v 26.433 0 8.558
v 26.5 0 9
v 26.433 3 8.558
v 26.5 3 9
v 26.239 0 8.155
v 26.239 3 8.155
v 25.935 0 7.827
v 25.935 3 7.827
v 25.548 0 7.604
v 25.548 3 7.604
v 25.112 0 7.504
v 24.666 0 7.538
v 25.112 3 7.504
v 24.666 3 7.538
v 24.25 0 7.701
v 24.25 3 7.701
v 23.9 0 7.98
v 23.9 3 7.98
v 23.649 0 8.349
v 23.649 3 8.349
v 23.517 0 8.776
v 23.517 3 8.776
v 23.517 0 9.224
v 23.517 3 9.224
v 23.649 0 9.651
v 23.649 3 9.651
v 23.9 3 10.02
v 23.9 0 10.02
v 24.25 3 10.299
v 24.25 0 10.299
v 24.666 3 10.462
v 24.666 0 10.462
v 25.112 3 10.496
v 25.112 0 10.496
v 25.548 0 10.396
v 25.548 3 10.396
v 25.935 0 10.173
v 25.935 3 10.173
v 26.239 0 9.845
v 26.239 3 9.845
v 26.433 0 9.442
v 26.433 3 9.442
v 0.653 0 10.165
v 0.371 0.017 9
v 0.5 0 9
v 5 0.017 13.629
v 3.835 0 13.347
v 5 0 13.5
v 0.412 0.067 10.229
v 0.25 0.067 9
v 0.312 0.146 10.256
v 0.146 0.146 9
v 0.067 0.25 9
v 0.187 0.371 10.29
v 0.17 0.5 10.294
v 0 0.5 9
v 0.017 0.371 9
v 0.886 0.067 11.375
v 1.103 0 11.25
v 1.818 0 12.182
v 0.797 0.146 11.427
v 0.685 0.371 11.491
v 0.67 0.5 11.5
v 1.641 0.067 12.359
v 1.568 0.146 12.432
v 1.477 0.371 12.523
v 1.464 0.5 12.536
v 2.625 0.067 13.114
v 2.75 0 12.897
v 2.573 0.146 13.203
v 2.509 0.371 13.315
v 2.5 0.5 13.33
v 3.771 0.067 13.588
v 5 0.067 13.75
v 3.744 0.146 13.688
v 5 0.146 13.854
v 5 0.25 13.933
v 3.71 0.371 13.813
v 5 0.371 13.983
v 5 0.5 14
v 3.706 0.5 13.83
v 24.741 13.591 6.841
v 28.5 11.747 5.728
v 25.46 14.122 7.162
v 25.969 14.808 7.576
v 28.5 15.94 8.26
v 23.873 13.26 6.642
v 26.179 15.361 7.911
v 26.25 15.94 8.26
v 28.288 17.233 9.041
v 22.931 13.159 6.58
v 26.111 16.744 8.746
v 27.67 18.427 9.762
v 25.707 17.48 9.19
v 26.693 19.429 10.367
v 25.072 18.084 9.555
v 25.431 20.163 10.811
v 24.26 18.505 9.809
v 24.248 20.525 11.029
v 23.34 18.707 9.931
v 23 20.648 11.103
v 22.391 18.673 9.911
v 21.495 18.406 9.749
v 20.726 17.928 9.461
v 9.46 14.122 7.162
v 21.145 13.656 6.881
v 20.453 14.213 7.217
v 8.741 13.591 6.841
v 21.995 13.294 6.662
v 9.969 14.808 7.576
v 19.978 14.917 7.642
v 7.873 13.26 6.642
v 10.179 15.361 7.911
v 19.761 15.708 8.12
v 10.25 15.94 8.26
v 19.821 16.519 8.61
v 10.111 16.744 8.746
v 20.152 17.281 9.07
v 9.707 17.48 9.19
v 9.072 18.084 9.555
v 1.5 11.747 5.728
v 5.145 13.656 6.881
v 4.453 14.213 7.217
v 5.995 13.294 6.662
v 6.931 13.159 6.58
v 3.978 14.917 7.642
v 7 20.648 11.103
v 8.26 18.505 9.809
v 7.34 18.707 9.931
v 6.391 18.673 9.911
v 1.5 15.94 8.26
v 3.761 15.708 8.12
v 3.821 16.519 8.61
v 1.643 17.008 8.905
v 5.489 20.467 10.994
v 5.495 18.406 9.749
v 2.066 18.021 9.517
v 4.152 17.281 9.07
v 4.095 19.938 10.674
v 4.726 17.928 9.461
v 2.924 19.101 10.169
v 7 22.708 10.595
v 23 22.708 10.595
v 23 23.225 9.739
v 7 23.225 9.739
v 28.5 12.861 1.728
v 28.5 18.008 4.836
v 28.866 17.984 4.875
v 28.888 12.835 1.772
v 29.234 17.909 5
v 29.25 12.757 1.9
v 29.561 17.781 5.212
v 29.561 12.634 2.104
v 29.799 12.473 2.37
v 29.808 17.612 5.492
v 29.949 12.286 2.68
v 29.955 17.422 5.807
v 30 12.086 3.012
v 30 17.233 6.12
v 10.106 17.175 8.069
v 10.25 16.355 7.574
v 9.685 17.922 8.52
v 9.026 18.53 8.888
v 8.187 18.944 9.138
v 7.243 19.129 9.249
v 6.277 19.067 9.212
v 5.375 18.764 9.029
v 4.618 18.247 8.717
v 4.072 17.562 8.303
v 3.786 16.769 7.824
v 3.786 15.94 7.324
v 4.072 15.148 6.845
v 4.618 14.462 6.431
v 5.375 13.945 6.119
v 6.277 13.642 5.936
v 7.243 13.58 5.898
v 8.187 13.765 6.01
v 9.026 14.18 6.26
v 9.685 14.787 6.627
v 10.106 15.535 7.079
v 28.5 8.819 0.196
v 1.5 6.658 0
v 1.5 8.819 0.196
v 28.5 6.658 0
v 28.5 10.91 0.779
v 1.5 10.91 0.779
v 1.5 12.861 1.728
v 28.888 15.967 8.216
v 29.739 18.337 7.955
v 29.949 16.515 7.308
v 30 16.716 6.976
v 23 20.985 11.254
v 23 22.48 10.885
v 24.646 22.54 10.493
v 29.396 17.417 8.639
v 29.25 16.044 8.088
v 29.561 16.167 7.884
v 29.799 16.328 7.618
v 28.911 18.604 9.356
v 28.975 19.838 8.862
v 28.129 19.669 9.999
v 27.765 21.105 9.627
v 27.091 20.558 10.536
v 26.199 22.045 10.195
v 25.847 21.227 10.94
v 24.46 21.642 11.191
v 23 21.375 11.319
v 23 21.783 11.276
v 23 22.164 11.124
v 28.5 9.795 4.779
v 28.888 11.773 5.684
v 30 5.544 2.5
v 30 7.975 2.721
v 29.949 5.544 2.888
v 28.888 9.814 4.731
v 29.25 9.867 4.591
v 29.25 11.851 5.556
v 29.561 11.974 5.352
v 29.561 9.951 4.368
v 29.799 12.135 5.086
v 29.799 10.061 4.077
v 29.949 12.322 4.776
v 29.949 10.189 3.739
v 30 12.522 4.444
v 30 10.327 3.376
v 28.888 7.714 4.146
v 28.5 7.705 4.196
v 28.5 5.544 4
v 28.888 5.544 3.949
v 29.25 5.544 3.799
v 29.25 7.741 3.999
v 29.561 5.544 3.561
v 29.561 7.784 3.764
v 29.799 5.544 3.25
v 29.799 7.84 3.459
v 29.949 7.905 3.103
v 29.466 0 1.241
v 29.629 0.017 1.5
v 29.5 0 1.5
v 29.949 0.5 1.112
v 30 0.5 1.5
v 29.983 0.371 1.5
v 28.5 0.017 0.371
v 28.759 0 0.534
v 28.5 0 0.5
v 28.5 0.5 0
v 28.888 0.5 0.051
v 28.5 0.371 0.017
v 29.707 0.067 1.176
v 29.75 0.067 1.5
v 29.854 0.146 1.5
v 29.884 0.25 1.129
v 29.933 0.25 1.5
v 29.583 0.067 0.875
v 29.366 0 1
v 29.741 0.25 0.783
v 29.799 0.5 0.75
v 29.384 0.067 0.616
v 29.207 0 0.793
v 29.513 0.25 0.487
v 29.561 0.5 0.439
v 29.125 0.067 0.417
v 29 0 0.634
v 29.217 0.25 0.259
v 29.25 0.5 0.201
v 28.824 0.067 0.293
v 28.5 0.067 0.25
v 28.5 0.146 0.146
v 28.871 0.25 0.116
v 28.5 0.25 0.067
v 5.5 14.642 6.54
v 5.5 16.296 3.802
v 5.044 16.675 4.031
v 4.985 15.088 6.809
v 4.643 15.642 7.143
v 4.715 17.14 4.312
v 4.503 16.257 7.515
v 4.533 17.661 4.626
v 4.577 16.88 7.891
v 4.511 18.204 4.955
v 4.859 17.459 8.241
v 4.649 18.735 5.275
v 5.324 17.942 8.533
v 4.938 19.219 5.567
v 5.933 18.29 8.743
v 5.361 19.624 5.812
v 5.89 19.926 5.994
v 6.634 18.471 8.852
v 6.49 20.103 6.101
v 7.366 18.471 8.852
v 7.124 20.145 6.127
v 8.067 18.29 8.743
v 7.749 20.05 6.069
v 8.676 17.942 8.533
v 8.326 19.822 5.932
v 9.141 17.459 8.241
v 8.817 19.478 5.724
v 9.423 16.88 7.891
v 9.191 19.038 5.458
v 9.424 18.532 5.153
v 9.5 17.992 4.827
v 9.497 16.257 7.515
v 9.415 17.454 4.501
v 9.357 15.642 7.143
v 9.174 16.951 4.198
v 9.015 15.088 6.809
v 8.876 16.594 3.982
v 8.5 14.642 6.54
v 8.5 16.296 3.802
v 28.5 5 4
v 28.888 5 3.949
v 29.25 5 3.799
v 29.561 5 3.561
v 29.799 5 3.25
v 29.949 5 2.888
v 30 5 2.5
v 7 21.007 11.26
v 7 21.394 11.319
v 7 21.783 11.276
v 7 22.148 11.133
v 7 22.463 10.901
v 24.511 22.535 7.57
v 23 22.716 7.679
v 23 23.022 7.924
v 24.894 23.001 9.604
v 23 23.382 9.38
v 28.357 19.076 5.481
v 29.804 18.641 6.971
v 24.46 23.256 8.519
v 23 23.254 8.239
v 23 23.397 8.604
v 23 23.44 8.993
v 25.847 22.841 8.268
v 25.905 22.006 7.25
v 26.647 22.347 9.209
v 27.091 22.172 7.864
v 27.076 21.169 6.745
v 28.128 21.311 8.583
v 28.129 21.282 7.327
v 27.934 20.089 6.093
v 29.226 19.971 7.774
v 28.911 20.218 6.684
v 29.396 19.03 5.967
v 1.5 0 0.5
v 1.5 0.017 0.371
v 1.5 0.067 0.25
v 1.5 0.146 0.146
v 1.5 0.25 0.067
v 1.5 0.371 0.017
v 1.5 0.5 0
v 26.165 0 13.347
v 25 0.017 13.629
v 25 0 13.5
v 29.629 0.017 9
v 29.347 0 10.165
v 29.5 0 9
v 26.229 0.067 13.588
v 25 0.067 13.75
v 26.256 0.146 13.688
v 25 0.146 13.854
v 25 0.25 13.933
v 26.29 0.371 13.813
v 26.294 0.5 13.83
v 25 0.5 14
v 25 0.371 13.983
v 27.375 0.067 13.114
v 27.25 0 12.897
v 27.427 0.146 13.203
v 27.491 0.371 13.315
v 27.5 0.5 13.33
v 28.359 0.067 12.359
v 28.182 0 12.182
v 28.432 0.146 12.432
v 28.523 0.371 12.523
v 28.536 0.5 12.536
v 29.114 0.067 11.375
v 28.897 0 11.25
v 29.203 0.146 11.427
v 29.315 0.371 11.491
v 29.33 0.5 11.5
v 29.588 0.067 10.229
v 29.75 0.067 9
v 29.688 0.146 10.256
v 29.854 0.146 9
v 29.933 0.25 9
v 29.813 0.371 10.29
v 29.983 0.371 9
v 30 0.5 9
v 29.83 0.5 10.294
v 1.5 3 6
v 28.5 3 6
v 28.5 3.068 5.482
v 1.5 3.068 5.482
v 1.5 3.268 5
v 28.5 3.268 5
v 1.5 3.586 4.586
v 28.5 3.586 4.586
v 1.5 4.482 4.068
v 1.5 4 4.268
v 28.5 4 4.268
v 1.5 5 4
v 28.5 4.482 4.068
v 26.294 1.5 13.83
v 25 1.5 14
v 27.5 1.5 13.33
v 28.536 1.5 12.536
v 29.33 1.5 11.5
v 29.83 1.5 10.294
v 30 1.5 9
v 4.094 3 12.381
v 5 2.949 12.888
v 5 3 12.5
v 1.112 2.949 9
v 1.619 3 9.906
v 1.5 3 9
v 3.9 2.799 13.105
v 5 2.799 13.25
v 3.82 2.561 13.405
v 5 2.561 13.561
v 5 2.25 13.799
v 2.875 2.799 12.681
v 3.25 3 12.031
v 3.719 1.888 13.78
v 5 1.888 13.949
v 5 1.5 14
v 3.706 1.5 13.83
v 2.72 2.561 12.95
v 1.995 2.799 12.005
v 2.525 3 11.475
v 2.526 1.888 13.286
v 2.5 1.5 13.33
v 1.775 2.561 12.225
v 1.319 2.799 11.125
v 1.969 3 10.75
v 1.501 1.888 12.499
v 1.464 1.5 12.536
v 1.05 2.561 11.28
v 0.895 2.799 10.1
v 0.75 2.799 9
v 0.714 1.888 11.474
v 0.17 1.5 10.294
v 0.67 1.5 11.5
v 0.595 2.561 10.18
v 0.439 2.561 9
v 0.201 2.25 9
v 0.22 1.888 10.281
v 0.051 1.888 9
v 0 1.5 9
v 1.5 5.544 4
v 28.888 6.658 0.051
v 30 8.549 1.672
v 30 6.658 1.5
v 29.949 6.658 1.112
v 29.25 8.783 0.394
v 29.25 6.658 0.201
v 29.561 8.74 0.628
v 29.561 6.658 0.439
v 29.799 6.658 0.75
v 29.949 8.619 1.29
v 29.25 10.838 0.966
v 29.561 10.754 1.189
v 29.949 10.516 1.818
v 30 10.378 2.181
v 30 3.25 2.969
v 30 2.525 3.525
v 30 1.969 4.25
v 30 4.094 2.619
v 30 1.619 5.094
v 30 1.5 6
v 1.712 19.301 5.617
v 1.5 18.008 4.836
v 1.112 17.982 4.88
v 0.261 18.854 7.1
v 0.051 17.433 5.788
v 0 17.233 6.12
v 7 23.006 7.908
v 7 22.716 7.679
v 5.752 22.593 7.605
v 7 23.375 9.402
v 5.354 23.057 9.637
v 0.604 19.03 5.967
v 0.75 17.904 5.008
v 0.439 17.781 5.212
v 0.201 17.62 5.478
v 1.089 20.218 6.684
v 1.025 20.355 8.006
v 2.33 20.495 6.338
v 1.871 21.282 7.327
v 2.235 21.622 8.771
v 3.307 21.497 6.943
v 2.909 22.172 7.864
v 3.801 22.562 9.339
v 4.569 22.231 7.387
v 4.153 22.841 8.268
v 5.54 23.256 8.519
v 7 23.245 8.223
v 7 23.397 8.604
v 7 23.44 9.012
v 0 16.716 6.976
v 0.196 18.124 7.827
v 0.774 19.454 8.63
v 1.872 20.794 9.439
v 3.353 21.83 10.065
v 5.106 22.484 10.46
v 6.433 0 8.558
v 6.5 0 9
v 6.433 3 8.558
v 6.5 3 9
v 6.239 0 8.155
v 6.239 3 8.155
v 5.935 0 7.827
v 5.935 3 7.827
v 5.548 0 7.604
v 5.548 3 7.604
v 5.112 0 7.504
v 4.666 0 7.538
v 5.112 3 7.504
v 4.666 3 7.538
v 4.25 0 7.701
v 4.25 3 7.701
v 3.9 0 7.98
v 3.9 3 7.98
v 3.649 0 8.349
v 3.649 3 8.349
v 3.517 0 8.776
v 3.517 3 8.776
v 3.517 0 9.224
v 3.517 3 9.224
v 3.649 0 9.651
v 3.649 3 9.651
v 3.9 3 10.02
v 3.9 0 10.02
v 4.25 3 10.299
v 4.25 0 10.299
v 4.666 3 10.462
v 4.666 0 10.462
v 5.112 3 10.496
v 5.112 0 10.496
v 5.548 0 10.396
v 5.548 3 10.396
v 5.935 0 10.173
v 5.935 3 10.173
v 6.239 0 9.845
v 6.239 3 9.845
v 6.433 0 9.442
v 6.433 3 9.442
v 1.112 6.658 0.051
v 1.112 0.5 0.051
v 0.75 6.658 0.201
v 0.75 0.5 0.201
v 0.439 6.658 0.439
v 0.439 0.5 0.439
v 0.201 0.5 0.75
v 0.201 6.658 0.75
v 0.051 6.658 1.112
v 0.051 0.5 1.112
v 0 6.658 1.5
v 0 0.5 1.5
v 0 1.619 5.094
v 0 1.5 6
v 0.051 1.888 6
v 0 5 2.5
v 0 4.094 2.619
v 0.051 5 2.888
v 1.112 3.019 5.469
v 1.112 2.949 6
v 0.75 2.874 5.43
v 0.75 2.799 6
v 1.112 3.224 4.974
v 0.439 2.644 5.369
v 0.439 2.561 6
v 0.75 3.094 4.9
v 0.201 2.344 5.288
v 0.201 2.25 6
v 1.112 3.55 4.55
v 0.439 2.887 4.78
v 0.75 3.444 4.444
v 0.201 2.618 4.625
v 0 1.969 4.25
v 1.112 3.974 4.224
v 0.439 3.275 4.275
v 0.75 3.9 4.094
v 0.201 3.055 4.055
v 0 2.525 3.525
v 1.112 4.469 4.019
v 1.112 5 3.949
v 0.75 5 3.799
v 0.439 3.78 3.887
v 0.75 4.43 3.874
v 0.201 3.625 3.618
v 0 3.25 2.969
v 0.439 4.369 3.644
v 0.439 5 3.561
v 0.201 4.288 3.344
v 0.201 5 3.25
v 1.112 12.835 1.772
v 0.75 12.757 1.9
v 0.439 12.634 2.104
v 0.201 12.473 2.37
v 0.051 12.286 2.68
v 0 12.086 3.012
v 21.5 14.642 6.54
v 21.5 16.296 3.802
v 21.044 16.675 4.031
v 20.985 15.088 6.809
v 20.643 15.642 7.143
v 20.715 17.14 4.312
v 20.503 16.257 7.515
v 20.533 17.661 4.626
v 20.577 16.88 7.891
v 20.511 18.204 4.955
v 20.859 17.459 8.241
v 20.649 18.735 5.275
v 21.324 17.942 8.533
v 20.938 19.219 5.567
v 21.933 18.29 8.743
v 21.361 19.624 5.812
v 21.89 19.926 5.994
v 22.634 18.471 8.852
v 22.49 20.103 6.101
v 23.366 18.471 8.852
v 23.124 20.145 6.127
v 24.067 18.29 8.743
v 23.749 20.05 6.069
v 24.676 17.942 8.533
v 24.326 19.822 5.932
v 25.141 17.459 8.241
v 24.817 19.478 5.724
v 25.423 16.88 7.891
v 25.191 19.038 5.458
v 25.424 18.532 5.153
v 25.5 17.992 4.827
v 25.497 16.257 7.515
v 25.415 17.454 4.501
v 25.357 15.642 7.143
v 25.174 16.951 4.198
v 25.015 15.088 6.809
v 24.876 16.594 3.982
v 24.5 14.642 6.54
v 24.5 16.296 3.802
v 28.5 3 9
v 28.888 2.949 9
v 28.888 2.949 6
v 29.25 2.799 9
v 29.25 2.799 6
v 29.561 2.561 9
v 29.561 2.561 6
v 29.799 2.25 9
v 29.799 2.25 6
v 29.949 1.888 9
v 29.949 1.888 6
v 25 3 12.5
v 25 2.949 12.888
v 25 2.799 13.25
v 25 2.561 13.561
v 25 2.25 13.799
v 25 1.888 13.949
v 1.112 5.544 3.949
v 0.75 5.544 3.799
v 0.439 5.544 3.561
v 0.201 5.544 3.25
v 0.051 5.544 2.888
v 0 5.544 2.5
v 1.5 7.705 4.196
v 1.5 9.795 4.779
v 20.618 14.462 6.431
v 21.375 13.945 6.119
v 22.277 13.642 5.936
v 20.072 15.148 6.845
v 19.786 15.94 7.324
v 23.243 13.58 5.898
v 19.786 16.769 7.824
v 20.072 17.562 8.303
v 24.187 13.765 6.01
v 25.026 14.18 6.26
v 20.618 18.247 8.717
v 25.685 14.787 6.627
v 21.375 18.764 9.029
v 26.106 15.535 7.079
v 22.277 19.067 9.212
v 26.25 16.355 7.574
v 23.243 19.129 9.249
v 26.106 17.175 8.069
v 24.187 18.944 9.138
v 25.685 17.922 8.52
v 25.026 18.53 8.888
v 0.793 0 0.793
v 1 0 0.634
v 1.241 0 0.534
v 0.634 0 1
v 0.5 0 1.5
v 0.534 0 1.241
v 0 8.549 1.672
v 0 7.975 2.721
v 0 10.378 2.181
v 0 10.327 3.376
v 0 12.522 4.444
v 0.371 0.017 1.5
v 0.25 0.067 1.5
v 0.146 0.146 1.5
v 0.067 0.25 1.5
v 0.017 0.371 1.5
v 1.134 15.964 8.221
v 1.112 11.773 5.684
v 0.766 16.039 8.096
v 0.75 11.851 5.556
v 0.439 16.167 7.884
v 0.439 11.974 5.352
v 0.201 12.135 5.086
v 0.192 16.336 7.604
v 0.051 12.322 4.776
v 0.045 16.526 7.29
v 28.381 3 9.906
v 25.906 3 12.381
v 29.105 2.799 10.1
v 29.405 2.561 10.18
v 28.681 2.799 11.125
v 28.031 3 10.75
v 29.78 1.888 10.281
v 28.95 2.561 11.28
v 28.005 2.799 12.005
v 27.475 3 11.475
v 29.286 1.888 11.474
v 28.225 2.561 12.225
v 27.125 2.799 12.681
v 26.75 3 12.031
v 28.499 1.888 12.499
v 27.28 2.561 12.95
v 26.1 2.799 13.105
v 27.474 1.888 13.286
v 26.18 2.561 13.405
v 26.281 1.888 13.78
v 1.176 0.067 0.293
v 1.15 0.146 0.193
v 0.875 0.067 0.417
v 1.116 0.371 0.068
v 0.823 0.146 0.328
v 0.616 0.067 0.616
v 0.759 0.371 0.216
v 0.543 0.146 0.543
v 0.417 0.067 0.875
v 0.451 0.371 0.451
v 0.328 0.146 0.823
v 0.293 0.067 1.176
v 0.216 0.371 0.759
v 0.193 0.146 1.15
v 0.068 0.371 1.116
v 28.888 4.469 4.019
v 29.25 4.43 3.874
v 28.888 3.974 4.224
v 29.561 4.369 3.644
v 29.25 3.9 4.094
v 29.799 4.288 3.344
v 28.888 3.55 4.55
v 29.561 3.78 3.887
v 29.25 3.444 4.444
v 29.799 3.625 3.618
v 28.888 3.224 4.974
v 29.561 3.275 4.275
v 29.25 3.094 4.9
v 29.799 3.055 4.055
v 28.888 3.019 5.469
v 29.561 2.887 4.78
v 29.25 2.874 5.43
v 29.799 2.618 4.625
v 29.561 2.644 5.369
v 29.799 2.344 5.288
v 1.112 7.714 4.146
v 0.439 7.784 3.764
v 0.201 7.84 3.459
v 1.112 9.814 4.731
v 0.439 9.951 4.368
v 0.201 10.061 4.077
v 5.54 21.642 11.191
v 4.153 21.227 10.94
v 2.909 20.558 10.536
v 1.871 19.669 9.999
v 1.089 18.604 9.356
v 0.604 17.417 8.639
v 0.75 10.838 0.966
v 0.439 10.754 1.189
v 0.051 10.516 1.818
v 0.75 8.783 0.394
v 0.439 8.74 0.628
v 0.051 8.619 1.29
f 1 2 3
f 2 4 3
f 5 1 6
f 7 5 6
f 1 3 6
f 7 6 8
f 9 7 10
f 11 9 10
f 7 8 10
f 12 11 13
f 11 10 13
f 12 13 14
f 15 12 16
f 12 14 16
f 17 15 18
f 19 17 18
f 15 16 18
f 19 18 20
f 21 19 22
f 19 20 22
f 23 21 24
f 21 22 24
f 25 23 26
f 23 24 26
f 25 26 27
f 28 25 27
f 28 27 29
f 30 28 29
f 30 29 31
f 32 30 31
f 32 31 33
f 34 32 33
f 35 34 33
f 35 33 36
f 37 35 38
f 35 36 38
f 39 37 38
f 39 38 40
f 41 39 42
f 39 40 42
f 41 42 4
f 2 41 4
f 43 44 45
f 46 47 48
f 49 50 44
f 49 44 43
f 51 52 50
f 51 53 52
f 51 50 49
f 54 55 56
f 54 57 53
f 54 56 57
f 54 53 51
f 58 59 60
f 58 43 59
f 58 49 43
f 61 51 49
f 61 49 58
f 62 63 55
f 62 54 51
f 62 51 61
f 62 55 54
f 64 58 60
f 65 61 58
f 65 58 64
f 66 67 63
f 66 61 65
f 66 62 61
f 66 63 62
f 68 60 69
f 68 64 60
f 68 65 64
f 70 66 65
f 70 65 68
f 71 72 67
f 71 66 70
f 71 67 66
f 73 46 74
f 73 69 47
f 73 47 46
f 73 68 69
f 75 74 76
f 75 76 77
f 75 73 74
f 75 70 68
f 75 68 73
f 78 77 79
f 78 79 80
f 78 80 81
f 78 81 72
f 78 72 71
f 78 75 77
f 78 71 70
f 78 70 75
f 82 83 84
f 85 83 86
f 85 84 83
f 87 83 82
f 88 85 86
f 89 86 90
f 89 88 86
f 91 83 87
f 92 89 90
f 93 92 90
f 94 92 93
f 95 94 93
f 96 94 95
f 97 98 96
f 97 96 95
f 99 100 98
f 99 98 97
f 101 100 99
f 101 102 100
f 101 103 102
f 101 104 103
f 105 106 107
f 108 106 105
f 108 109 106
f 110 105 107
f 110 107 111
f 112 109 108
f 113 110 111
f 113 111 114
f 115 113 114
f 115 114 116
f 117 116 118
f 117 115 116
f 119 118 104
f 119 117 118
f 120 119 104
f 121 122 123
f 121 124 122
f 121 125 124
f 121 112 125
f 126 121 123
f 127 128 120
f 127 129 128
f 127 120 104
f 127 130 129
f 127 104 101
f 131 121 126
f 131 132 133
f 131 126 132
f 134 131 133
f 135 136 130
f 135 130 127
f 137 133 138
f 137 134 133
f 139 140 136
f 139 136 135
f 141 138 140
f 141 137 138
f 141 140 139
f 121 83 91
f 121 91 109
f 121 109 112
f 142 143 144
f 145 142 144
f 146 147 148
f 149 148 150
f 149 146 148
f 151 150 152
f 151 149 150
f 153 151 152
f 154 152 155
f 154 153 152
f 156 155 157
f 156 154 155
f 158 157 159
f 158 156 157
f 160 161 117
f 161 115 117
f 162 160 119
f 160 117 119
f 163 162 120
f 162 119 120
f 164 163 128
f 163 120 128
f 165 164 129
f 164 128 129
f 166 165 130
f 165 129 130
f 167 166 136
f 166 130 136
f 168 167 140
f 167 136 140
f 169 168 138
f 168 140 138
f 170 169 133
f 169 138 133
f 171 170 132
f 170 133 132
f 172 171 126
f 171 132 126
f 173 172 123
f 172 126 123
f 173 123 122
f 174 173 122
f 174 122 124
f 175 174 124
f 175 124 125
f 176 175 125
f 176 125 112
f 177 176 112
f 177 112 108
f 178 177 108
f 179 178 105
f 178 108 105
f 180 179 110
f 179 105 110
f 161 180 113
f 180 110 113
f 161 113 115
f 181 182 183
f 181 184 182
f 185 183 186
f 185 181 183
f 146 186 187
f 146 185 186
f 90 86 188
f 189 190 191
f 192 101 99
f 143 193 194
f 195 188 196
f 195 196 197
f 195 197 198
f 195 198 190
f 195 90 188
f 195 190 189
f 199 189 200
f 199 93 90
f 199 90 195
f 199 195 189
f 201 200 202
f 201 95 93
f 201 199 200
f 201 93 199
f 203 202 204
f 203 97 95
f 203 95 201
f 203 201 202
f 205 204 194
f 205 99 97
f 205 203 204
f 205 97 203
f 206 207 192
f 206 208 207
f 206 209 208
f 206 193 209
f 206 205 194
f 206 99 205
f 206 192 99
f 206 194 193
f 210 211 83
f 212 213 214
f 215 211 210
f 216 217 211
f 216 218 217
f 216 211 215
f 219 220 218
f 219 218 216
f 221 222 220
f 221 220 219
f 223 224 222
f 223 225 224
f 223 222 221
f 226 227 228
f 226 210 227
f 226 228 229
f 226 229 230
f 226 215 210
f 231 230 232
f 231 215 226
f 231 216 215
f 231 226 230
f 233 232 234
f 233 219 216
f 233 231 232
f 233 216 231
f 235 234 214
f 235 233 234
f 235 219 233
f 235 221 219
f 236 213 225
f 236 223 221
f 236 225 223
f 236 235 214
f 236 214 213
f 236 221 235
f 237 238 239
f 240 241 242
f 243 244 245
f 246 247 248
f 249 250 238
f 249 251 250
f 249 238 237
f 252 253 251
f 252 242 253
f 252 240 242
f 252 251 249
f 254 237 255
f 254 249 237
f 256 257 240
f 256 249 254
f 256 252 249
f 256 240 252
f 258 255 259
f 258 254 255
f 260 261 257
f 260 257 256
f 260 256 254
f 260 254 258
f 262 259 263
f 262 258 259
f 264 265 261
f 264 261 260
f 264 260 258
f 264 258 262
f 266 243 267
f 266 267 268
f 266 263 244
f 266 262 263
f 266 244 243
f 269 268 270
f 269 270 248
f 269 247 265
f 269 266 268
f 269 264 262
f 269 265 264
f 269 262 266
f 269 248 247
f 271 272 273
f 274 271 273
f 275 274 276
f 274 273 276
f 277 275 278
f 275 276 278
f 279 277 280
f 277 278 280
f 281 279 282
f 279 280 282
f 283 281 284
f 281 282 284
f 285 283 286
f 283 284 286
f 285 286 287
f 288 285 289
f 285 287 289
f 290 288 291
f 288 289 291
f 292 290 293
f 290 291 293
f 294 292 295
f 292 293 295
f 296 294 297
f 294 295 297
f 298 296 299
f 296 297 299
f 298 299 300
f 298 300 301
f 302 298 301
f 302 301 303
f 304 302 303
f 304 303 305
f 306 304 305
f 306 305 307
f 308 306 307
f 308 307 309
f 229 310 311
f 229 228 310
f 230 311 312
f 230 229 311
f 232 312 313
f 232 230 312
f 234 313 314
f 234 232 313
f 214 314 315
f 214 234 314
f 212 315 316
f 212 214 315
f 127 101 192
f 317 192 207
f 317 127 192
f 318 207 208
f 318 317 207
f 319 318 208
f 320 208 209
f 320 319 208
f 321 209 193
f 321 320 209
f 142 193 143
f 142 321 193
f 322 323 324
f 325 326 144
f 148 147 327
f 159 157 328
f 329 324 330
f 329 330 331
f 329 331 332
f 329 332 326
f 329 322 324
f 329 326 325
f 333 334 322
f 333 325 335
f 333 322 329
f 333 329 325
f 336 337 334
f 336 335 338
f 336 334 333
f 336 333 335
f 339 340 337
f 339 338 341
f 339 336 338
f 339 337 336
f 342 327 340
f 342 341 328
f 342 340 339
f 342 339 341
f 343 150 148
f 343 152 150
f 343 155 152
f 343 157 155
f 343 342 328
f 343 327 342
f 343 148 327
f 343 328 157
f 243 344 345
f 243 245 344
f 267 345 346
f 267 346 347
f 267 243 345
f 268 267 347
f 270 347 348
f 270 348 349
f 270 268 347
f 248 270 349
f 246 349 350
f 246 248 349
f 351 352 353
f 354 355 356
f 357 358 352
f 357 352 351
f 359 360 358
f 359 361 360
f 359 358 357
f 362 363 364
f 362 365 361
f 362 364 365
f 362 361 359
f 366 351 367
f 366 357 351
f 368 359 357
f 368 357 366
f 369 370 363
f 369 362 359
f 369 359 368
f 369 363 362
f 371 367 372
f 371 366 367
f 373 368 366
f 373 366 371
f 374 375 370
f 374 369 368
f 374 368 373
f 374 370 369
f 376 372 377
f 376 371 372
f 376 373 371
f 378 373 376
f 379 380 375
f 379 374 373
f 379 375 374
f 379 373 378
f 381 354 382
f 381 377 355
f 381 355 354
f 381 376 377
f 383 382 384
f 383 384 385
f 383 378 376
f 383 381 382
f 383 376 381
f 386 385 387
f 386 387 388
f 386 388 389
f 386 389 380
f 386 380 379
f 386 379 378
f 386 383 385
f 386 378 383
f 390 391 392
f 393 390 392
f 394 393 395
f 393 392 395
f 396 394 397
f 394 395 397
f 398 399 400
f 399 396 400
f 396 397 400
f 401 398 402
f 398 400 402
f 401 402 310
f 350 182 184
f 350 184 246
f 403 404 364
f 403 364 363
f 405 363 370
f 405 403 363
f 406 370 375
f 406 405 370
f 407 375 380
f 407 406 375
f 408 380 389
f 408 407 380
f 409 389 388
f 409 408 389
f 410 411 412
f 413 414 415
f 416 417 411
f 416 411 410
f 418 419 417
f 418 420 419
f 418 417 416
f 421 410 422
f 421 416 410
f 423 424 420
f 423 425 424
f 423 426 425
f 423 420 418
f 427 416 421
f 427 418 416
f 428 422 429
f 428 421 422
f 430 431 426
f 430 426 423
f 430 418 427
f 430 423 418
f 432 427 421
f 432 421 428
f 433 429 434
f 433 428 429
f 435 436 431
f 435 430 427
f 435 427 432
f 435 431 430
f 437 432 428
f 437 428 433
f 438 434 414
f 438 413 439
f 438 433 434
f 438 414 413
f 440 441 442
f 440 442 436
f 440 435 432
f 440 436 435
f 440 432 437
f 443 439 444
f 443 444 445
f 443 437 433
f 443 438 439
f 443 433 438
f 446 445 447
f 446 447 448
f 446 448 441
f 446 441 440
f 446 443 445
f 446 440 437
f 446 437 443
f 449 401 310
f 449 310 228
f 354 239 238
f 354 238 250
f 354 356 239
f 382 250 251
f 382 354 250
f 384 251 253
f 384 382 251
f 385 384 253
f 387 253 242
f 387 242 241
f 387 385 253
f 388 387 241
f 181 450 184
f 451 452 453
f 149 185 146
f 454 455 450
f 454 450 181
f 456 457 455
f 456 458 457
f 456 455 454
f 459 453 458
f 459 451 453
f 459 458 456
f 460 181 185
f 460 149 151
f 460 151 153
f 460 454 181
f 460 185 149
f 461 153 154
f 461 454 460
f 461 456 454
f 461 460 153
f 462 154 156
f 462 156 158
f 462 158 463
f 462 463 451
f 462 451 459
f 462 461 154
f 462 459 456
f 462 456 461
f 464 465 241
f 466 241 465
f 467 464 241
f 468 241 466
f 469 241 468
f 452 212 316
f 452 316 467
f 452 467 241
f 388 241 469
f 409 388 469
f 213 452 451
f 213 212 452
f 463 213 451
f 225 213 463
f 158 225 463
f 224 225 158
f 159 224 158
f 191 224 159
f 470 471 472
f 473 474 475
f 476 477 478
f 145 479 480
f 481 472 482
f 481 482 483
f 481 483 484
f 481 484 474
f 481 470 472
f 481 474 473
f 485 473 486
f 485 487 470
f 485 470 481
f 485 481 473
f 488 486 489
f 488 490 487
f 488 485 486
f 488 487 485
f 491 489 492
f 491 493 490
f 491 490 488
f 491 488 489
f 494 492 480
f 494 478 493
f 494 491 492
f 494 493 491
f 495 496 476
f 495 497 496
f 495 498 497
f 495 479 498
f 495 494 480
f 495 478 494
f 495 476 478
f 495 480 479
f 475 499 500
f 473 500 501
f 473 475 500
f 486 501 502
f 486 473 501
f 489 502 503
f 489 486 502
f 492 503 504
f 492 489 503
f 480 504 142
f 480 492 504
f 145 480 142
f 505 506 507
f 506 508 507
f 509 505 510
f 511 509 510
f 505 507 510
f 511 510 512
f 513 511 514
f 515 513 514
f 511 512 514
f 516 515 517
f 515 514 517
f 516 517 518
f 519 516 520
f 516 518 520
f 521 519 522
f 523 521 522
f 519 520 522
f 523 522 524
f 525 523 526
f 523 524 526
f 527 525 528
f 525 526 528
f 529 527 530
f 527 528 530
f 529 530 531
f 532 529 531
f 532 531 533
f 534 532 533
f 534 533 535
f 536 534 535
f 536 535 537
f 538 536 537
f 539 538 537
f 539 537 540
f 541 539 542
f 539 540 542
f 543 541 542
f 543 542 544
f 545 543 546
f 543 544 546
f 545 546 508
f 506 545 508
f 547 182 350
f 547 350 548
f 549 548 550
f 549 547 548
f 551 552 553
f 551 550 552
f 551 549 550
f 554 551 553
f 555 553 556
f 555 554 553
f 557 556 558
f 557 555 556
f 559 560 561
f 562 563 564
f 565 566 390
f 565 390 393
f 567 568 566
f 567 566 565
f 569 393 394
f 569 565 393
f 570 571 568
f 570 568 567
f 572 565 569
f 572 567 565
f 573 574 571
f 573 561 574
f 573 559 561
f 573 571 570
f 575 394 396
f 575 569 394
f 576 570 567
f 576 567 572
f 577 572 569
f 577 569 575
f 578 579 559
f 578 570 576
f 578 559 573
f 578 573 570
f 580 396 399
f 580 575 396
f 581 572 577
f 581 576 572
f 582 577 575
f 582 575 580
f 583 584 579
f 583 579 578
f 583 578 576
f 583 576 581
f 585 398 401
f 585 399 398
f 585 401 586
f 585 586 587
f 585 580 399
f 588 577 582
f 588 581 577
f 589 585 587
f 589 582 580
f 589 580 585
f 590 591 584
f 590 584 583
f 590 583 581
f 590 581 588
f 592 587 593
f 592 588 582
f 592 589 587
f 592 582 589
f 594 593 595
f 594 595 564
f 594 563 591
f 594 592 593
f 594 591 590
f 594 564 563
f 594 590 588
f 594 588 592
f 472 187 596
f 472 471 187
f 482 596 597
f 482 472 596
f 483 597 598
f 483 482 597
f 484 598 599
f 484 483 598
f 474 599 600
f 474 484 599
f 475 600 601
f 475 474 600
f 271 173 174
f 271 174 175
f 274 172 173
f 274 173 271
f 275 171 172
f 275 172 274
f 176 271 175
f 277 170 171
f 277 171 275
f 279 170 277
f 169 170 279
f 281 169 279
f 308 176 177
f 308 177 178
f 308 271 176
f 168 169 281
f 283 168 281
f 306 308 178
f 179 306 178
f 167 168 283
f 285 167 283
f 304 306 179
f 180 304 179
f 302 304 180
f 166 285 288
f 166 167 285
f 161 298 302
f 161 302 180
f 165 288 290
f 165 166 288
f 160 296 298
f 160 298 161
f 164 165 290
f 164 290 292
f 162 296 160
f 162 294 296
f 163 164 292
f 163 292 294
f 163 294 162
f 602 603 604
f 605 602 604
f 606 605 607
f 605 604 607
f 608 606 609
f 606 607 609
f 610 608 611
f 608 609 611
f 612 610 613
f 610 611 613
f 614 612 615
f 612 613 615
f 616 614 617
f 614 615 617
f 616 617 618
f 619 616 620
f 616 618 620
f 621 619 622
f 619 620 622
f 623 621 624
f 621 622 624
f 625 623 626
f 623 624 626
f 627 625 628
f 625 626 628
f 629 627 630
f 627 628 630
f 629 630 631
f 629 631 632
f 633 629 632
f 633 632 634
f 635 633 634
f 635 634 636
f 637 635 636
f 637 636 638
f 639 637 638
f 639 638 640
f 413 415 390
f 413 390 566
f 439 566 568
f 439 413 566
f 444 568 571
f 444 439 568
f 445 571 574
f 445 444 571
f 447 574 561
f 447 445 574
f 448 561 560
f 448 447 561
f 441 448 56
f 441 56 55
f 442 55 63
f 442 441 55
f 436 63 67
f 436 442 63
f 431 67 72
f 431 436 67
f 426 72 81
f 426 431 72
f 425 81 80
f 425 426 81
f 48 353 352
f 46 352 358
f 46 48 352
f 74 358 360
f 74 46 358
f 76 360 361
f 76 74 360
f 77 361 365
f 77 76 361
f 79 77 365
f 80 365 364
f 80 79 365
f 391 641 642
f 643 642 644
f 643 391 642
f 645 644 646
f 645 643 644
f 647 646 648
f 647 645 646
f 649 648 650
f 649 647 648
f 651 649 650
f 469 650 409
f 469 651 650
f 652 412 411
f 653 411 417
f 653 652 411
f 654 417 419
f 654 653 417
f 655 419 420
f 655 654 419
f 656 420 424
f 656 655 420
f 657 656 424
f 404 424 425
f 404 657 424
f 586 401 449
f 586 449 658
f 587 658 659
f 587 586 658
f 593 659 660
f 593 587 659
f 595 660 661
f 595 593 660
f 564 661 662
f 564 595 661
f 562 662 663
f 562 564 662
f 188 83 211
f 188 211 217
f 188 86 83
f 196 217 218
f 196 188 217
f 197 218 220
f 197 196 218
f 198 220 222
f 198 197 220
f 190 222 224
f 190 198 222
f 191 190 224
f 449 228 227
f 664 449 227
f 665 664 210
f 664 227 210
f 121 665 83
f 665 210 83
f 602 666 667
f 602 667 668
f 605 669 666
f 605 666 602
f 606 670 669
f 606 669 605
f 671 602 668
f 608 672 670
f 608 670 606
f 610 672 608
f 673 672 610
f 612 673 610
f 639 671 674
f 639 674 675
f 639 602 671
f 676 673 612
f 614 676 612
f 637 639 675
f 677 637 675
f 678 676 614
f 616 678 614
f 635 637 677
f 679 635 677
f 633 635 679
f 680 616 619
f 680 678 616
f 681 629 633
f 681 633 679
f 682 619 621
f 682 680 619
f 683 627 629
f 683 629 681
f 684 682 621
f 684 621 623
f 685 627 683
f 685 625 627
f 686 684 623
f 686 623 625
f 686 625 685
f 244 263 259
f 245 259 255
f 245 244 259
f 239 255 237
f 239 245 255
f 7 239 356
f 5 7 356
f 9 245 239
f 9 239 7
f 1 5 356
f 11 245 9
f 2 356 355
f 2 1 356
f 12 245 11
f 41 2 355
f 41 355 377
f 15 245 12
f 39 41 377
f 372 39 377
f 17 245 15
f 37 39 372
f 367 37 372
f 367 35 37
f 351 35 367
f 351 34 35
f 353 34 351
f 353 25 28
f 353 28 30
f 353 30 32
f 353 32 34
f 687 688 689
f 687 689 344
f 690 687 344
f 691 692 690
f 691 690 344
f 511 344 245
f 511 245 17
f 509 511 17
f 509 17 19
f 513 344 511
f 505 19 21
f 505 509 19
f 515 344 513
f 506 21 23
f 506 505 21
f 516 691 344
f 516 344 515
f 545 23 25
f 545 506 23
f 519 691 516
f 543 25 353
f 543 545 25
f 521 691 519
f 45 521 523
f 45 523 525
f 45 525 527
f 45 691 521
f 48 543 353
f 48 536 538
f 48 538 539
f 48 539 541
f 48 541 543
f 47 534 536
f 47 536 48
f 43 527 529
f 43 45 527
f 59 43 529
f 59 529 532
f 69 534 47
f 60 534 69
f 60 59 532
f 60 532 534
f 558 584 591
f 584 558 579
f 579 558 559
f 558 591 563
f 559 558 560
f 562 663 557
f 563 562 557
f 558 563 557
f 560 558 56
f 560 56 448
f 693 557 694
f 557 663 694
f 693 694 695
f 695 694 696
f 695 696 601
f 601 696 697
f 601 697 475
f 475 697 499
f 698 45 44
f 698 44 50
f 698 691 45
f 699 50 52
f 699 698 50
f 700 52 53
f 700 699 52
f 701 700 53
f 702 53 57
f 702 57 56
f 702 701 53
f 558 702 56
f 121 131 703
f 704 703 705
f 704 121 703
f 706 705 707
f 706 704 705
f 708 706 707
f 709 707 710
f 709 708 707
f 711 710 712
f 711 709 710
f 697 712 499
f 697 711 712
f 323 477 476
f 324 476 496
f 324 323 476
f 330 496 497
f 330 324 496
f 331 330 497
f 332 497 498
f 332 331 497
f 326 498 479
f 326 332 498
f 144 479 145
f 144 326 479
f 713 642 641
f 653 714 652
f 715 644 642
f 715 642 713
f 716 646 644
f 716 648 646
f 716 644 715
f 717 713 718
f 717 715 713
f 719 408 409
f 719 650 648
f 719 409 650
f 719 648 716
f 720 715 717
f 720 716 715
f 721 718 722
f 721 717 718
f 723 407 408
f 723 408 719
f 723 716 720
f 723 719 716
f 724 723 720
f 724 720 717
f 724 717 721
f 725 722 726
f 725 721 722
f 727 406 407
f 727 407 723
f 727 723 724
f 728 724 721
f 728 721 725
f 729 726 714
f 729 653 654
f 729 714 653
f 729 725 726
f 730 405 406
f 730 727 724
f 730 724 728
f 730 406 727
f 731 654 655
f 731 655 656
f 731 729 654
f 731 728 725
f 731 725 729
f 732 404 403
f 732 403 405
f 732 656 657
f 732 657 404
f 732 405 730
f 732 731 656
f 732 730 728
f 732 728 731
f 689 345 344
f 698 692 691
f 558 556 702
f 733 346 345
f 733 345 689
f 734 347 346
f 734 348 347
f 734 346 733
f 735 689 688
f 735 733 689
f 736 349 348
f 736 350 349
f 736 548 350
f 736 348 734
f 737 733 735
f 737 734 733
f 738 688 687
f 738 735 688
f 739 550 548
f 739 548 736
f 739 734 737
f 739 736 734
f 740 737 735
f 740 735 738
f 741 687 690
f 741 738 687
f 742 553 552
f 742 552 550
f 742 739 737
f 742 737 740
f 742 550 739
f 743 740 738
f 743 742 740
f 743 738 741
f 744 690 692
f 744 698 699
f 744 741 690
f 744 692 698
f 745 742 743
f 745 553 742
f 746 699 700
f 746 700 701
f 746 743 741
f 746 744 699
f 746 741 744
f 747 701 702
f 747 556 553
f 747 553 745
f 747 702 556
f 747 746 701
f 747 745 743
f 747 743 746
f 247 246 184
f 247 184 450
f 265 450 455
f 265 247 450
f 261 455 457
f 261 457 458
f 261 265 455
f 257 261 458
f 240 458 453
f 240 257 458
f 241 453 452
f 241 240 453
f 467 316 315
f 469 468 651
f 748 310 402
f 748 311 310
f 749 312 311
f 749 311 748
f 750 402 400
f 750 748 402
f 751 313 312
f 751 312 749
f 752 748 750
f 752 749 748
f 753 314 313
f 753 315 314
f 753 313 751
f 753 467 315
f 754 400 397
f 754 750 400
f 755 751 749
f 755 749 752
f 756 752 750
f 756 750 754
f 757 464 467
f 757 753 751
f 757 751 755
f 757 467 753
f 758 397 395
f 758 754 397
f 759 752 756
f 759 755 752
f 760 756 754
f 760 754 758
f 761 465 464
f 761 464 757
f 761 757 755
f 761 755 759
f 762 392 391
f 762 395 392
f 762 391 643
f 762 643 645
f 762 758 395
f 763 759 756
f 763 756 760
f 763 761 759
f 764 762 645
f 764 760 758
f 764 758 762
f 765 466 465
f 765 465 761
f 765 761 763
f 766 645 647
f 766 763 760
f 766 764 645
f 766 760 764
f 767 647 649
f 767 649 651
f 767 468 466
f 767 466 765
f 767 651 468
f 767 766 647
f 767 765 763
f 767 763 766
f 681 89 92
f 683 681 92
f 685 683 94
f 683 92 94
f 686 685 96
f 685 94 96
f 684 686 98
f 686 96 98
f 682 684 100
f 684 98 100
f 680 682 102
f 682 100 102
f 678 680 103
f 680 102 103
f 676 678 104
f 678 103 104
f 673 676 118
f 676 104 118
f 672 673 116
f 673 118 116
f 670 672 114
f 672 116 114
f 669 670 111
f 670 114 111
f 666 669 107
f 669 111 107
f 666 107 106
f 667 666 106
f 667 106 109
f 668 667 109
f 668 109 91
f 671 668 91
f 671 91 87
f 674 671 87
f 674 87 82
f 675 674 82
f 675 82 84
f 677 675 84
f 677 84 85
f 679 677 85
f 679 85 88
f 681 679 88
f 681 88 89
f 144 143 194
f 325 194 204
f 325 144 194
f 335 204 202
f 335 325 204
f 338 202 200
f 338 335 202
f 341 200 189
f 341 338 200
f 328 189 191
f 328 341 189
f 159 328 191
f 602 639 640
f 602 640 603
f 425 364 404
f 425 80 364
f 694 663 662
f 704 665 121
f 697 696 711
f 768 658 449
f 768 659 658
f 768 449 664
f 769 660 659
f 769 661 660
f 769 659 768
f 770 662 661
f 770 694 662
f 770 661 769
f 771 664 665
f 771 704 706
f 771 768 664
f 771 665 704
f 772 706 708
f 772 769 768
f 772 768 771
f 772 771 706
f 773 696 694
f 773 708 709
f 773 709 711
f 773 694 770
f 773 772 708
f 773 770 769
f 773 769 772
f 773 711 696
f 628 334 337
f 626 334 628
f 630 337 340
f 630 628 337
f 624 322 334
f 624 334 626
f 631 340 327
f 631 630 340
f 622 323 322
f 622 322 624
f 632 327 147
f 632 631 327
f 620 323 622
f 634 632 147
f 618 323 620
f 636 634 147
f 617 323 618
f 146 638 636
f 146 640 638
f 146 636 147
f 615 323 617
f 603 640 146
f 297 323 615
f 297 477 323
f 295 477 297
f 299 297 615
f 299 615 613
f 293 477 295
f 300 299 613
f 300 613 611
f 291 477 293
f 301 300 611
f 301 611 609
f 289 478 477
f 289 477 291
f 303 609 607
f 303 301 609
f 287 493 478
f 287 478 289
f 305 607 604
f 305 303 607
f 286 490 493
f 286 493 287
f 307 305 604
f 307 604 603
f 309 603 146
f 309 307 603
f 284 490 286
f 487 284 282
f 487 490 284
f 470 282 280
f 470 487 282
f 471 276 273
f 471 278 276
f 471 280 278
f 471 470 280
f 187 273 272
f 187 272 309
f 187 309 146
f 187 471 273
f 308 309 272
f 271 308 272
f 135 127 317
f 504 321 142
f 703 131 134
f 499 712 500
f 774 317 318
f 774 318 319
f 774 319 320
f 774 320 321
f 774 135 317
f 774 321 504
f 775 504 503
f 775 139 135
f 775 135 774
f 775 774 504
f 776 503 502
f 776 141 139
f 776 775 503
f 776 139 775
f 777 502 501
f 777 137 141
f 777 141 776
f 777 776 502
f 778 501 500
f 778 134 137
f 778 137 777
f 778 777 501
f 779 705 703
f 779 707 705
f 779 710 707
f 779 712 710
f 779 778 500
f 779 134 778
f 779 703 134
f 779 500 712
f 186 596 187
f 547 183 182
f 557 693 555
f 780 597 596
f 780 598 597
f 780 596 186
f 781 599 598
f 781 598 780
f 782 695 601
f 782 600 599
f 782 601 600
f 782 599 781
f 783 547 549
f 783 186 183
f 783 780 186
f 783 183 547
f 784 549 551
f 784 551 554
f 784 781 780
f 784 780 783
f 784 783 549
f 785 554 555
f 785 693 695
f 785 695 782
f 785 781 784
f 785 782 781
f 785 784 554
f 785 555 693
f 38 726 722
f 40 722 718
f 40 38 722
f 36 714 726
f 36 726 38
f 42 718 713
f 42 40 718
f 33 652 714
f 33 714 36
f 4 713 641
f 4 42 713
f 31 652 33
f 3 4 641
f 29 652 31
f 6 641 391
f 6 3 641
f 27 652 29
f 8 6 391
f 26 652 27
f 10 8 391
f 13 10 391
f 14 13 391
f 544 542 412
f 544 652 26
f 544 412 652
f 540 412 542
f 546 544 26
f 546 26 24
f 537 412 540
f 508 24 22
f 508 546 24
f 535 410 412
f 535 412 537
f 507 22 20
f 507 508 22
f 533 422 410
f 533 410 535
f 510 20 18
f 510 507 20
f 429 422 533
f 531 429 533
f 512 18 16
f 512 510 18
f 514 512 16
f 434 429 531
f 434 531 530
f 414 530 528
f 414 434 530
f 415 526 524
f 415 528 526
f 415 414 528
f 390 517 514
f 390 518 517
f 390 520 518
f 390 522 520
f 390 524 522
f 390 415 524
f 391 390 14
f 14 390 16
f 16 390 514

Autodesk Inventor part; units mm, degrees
ref_plane "YZ Plane" through (0, 0, 0) normal (1, 0, 0) x (0, 1, 0)
ref_plane "XZ Plane" through (0, 0, 0) normal (0, 1, 0) x (-1, 0, 0)
ref_plane "XY Plane" through (0, 0, 0) normal (0, 0, 1) x (1, 0, 0)
sketch "Sketch5" plane through (0, 0, 0) normal (1, 0, 0) x (0, 1, 0)
  line L0 (0, 0) -> (0, 14)
  line L1 (0, 14) -> (3, 14)
  line L2 (3, 14) -> (3, 4)
  line L3 (3, 4) -> (8.8859, 4)
  line L4 (8.8859, 4) -> (21.9322, 11.8789)
  line L5 (21.9322, 11.8789) -> (24, 8.4549)
  line L6 (24, 8.4549) -> (10, 0)
  line L7 (10, 0) -> (0, 0)
  dimension "d31" = 3
  dimension "d32" = 4
  dimension "d33" = 4
  dimension "d34" = 14
  dimension "d35" = 10
  dimension "d36" = 10
extrude "Extrusion4" add sketch "Sketch5" along normal blind 30
sketch "Sketch6" plane through (0, 3, 14) normal (0, 1, 0) x (1, 0, 0)
  circle A0 centre (5, 5) radius 1.5
  circle A1 centre (25, 5) radius 1.5
  line L0 (30, 10) -> (30, 0) projected
  line L1 (0, 0) -> (30, 0) projected
  line L2 (0, 0) -> (0, 10) projected
  point P0 (0, 14)
  dimension "d39" = 3
  dimension "d40" = 3
  dimension "d41" = 5
  dimension "d42" = 5
  dimension "d43" = 5
  dimension "d44" = 5
extrude "Extrusion5" cut sketch "Sketch6" against normal blind 30
fillet "Fillet5" radius 5 2 edges at (0, 1.5, 14) (30, 1.5, 14)
sketch "Sketch7" plane through (30, 24, 8.4549) normal (0, 0.517, -0.856) x (-1, 0, 0)
  arc A0 (8.5, -9) -> (5.5, -9) centre (7, -7) ccw
  arc A1 (24.5, -9) -> (21.5, -9) centre (23, -7) ccw
  line L0 (30, 0) -> (30, -16.355) projected
  line L1 (30, 0) -> (0, 0) projected
  line L2 (0, -16.355) -> (0, 0) projected
  line L3 (5.5, -9) -> (8.5, -9)
  line L4 (21.5, -9) -> (24.5, -9)
  point P0 (30, -24.9151)
  dimension "d48" = 5
  dimension "d49" = 5
  dimension "d50" = 7
  dimension "d51" = 7
  dimension "d52" = 7
  dimension "d53" = 7
  dimension "d54" = 4.5
extrude "Extrusion6" cut sketch "Sketch7" against normal blind 30
fillet "Fillet6" radius 7 2 edges at (0, 22.9661, 10.1669) (30, 22.9661, 10.1669)
sketch "Sketch8" plane through (0, 8.8859, 4) normal (0, -0.517, 0.856) x (1, 0, 0)
  arc A0 (8.5, 6.2408) -> (5.5, 6.2408) centre (7, 8.2408) ccw projected
  circle A1 centre (7, 8.2408) radius 3.25
  arc A2 (24.5, 6.2408) -> (21.5, 6.2408) centre (23, 8.2408) ccw projected
  circle A3 centre (23, 8.2408) radius 3.25
  point P0 (0, -9.6742)
  dimension "d58" = 6.5
  dimension "d59" = 6.5
extrude "Extrusion7" cut sketch "Sketch8" against normal blind 0.8
fillet "Fillet7" radius 2 1 edges at (15, 3, 4)
fillet "Fillet8" radius 12 2 edges at (15, 8.8859, 4) (15, 10, 0)
fillet "Fillet9" radius 1.5 9 edges at (15, 24, 8.4549) (2.0503, 22.245, 7.395) (0, 15.4345, 3.282) (0, 9.8774, 0.44) (0, 3.3288, 0) (30, 15.4345, 3.282) (30, 9.8774, 0.44) (30, 3.3288, 0) (27.9497, 22.245, 7.395)
fillet "Fillet10" radius 1.5 14 edges at (30, 13.8435, 6.9941) (27.9497, 20.1771, 10.819) (15, 21.9322, 11.8789) (2.0503, 20.1771, 10.819) (0, 13.8435, 6.9941) (0, 8.7633, 4.44) (0, 5.2717, 4) (0, 3, 7.5) (1.4645, 3, 12.5355) (15, 3, 14) (28.5355, 3, 12.5355) (30, 3, 7.5) (30, 5.2717, 4) (30, 8.7633, 4.44)
fillet "Fillet11" radius 0.5 8 edges at (29.5607, 0, 0.4393) (15, 0, 0) (0.4393, 0, 0.4393) (0, 0, 5.25) (1.4645, 0, 12.5355) (15, 0, 14) (28.5355, 0, 12.5355) (30, 0, 5.25)
properties part number "SwitchMount"
